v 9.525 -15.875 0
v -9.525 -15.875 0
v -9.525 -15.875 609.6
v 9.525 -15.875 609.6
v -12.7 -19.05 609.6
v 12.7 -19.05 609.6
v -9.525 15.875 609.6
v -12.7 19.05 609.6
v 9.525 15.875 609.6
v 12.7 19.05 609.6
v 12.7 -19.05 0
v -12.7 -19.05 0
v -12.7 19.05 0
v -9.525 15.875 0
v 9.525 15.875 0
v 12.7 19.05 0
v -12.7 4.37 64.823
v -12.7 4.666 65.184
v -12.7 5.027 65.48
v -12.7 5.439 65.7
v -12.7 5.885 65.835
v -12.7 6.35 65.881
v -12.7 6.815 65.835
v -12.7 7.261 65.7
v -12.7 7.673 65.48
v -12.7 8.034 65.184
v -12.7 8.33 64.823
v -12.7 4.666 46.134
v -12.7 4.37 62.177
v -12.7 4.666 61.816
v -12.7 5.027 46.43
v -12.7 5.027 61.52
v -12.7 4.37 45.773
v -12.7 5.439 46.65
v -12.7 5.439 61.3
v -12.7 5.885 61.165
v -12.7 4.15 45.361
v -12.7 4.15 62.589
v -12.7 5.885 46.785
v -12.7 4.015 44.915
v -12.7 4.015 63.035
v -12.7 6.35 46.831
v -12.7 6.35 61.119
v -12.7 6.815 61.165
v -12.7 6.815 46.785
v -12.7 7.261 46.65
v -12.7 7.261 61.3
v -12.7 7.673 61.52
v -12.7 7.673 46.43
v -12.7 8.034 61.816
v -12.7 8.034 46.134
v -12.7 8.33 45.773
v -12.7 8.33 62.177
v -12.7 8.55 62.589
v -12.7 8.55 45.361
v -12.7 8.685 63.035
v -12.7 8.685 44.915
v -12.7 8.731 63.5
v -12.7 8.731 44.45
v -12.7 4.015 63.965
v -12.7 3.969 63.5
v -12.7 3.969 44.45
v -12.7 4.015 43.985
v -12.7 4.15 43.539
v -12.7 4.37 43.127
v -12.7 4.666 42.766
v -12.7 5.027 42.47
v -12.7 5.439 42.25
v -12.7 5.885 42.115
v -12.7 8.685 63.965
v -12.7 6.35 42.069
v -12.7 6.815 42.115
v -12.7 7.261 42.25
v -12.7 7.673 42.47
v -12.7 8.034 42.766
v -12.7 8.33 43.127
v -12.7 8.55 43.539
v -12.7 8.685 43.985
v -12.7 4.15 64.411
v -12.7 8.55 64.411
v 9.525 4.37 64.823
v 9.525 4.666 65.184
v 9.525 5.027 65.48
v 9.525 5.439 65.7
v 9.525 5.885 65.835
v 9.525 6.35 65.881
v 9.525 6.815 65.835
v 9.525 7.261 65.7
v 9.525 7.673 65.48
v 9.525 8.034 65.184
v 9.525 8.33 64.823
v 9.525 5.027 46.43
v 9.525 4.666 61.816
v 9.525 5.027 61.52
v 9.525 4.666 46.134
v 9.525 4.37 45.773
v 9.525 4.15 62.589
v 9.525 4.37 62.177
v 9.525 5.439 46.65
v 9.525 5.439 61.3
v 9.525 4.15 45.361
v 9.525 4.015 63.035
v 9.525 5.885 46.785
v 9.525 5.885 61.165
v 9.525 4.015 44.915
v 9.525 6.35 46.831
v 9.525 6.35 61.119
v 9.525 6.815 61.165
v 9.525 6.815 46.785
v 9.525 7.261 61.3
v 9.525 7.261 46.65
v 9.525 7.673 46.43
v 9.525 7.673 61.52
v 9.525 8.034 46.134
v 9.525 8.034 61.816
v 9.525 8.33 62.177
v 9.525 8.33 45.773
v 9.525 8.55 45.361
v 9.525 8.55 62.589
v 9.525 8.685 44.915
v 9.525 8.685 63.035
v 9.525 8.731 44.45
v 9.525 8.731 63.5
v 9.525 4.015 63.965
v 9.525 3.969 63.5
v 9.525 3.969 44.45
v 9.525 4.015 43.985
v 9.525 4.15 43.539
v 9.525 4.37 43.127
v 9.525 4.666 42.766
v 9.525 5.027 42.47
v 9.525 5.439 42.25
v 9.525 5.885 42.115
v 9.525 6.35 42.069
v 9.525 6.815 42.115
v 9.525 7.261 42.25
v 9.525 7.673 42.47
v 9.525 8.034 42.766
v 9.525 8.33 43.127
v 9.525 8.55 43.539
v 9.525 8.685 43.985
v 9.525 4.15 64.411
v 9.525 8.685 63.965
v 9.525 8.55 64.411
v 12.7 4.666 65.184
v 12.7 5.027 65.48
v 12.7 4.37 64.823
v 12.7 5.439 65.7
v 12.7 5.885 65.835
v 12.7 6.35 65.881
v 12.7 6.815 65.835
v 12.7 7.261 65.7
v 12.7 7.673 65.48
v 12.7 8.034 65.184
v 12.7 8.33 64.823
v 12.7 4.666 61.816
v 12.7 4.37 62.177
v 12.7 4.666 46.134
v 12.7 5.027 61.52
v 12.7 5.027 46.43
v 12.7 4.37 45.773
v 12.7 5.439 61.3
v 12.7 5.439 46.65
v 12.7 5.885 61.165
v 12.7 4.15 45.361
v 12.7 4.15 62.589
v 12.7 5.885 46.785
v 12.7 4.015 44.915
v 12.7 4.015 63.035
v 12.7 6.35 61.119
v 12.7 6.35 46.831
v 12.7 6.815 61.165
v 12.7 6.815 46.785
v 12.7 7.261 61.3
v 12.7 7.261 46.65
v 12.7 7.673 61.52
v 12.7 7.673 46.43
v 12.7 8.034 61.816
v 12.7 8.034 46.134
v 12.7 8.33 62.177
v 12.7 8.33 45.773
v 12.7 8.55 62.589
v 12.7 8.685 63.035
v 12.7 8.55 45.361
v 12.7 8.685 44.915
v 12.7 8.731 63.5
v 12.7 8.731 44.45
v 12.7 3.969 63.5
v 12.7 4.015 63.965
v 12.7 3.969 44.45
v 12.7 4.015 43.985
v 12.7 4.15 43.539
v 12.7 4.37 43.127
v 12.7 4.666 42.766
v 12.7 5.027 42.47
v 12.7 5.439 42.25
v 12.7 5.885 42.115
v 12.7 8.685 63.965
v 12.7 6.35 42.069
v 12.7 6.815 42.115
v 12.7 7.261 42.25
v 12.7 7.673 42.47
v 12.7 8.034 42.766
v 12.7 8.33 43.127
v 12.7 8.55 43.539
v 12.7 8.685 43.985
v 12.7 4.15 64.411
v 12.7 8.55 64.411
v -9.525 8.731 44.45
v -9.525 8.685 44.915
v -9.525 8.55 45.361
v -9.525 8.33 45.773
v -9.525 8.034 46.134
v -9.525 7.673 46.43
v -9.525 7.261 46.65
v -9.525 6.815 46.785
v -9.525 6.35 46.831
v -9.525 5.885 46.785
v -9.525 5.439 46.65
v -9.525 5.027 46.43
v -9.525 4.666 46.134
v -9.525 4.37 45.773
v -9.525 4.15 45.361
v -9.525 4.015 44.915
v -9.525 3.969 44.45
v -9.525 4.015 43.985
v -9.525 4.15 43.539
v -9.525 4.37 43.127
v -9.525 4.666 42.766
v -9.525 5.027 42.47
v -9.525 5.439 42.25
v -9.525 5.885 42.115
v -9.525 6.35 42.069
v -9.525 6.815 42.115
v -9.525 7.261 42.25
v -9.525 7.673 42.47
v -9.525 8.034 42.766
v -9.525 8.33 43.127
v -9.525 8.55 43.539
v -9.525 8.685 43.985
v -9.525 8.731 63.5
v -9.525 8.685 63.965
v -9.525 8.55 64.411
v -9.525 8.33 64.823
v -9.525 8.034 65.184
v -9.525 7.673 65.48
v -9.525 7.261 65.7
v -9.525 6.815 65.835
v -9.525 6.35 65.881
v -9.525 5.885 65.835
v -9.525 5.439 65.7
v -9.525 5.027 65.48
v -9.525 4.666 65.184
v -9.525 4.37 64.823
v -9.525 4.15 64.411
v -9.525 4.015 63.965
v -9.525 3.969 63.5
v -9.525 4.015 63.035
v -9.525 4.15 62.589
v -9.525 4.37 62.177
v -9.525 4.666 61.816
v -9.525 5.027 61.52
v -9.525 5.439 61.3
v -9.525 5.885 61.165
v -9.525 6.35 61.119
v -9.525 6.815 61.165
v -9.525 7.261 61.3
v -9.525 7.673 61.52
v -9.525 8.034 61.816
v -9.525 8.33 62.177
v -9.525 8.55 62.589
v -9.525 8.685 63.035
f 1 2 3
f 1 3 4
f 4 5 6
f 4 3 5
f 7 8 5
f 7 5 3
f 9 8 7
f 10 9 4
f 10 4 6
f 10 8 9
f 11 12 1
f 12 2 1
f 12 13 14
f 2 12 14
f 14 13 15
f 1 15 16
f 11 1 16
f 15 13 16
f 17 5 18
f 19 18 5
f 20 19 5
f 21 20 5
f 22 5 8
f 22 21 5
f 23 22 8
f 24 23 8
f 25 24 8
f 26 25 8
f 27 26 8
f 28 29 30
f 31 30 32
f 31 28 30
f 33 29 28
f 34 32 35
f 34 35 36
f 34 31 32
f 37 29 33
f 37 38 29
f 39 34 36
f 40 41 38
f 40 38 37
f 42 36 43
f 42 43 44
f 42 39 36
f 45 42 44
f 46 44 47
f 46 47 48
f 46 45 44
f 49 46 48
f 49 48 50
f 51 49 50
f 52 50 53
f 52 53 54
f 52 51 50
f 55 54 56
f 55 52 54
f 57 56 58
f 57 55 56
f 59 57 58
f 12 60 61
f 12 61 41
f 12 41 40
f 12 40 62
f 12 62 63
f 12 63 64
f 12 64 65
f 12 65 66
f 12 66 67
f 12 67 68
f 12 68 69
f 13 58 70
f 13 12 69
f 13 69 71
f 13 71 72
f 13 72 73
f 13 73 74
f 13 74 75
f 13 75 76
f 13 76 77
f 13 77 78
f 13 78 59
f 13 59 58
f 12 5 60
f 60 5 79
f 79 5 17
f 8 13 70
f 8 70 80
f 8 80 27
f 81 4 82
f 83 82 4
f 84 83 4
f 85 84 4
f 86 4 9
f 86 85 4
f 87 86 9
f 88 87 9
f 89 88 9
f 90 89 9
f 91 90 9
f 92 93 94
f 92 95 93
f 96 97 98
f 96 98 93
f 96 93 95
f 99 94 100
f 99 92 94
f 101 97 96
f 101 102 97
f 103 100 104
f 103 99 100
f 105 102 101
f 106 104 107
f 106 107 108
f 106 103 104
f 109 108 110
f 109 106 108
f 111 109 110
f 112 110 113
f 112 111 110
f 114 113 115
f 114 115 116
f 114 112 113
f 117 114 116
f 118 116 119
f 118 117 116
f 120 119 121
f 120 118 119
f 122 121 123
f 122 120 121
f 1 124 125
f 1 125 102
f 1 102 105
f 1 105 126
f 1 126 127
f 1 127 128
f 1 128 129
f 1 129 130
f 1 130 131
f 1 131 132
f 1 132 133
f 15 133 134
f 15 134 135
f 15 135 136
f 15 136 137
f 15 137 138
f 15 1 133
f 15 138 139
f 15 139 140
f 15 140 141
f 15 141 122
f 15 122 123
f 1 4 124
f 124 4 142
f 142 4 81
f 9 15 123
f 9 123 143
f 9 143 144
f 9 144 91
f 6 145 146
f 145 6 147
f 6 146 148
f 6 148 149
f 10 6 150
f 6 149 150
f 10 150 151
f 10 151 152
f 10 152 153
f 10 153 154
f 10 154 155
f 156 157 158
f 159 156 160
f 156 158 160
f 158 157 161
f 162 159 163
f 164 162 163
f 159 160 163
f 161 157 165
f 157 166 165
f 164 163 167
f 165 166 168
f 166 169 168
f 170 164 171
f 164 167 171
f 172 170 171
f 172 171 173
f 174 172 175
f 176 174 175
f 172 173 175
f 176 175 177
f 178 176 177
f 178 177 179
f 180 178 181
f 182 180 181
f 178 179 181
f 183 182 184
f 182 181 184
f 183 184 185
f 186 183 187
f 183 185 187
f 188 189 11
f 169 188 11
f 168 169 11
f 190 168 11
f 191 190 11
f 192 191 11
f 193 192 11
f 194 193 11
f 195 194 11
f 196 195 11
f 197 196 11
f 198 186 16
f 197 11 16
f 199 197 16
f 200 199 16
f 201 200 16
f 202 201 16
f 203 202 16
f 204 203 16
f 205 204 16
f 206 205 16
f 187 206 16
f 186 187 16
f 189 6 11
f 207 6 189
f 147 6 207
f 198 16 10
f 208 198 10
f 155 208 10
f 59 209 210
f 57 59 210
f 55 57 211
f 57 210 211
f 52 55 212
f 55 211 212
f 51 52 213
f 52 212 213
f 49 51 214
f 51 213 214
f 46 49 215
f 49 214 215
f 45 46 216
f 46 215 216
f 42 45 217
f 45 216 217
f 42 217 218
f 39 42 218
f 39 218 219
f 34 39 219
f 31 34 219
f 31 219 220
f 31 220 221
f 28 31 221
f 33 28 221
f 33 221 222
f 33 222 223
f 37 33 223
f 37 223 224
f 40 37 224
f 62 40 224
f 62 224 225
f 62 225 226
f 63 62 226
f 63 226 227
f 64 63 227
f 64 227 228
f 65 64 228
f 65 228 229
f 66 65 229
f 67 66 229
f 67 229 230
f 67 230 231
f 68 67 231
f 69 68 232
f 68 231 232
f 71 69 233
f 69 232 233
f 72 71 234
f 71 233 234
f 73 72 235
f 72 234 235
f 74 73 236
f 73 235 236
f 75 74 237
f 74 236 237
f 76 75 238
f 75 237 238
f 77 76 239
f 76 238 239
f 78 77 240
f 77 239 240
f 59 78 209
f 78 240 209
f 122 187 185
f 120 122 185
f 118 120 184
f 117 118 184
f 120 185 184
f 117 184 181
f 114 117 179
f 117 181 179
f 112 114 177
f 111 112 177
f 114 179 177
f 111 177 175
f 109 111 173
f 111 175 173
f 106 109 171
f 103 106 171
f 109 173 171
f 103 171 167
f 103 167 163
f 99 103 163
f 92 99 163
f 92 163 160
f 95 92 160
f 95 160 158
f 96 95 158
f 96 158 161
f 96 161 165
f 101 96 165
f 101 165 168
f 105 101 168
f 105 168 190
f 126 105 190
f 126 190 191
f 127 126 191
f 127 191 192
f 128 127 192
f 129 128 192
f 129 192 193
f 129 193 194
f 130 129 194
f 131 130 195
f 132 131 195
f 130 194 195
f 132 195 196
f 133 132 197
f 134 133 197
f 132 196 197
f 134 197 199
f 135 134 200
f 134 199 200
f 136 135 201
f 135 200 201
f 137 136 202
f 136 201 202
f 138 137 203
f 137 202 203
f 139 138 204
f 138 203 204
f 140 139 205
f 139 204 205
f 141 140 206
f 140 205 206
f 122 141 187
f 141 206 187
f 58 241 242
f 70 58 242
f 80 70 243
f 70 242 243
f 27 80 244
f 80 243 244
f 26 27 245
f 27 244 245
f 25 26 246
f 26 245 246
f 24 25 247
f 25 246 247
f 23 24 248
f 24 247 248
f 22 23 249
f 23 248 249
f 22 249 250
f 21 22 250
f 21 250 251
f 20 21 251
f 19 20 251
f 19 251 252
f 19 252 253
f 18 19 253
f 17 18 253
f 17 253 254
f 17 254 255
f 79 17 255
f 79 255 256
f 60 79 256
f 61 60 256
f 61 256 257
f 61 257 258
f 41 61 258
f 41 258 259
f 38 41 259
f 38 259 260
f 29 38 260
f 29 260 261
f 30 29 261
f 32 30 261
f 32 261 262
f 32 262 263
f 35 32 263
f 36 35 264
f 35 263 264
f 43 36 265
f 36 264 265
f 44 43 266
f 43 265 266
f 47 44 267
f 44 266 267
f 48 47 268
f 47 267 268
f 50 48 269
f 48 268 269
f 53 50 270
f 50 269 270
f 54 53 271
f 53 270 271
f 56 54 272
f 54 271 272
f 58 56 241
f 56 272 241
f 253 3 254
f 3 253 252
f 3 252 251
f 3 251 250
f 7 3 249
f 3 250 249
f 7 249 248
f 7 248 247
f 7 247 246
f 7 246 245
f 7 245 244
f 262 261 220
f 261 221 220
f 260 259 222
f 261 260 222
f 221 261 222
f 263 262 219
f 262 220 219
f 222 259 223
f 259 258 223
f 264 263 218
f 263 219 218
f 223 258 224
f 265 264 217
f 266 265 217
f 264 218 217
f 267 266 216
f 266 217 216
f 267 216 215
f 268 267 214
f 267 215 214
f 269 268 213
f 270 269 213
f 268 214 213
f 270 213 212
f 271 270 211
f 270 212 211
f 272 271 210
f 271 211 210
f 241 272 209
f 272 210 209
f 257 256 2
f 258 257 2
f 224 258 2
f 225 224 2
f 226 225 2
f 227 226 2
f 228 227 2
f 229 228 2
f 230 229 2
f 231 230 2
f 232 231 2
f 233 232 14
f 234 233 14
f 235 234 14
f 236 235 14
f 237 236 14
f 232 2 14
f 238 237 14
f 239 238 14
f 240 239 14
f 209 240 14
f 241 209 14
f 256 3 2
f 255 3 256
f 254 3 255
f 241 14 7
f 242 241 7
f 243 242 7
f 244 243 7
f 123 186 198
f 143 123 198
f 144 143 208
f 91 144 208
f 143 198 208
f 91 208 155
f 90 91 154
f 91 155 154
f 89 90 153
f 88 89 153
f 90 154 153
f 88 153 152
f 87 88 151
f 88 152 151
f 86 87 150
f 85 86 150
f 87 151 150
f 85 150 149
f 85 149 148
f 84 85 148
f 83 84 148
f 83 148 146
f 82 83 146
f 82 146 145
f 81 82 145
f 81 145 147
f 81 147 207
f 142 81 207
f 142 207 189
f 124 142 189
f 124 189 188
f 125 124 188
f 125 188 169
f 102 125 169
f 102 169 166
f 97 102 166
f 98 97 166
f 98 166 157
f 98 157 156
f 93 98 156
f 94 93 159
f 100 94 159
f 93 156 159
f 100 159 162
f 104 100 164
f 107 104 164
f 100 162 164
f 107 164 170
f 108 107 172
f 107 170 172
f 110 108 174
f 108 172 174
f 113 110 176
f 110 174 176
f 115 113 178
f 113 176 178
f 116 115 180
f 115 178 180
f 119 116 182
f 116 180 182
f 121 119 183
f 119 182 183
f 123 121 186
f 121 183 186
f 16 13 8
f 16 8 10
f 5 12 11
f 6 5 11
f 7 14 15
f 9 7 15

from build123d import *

# Parameters (mm, degrees)
SKETCH1_W           = 25.4
SKETCH1_H           = 38.1
BOSS_EXTRUDE1_DEPTH = 609.6
SHELL1_T            = -3.175
SKETCH2_R           = 2.38125
CUT_EXTRUDE1_DEPTH  = 611.426262951


with BuildPart() as part:
    # Sketch1 → Boss-Extrude1 (new body)
    with BuildSketch(Plane.XY):
        Rectangle(SKETCH1_W, SKETCH1_H)
    extrude(amount=BOSS_EXTRUDE1_DEPTH)

    # Shell1
    shell1_openings = [part.faces().sort_by_distance(p)[0] for p in [
        (0, 0, 609.6),
        (0, 0, 0),
    ]]
    offset(amount=SHELL1_T, openings=shell1_openings, kind=Kind.INTERSECTION)

    # Sketch2 → Cut-Extrude1 (cut, through all)
    with BuildSketch(Plane(origin=(12.7, 0, 0), x_dir=(0, 0, -1), z_dir=(1, 0, 0))):
        with Locations(Location((-44.45, 6.35, 0), (0, 0, 90))):
            Circle(SKETCH2_R)
        with Locations(Location((-63.5, 6.35, 0), (0, 0, 90))):
            Circle(SKETCH2_R)
    extrude(amount=-CUT_EXTRUDE1_DEPTH, mode=Mode.SUBTRACT)


solid = part.part
